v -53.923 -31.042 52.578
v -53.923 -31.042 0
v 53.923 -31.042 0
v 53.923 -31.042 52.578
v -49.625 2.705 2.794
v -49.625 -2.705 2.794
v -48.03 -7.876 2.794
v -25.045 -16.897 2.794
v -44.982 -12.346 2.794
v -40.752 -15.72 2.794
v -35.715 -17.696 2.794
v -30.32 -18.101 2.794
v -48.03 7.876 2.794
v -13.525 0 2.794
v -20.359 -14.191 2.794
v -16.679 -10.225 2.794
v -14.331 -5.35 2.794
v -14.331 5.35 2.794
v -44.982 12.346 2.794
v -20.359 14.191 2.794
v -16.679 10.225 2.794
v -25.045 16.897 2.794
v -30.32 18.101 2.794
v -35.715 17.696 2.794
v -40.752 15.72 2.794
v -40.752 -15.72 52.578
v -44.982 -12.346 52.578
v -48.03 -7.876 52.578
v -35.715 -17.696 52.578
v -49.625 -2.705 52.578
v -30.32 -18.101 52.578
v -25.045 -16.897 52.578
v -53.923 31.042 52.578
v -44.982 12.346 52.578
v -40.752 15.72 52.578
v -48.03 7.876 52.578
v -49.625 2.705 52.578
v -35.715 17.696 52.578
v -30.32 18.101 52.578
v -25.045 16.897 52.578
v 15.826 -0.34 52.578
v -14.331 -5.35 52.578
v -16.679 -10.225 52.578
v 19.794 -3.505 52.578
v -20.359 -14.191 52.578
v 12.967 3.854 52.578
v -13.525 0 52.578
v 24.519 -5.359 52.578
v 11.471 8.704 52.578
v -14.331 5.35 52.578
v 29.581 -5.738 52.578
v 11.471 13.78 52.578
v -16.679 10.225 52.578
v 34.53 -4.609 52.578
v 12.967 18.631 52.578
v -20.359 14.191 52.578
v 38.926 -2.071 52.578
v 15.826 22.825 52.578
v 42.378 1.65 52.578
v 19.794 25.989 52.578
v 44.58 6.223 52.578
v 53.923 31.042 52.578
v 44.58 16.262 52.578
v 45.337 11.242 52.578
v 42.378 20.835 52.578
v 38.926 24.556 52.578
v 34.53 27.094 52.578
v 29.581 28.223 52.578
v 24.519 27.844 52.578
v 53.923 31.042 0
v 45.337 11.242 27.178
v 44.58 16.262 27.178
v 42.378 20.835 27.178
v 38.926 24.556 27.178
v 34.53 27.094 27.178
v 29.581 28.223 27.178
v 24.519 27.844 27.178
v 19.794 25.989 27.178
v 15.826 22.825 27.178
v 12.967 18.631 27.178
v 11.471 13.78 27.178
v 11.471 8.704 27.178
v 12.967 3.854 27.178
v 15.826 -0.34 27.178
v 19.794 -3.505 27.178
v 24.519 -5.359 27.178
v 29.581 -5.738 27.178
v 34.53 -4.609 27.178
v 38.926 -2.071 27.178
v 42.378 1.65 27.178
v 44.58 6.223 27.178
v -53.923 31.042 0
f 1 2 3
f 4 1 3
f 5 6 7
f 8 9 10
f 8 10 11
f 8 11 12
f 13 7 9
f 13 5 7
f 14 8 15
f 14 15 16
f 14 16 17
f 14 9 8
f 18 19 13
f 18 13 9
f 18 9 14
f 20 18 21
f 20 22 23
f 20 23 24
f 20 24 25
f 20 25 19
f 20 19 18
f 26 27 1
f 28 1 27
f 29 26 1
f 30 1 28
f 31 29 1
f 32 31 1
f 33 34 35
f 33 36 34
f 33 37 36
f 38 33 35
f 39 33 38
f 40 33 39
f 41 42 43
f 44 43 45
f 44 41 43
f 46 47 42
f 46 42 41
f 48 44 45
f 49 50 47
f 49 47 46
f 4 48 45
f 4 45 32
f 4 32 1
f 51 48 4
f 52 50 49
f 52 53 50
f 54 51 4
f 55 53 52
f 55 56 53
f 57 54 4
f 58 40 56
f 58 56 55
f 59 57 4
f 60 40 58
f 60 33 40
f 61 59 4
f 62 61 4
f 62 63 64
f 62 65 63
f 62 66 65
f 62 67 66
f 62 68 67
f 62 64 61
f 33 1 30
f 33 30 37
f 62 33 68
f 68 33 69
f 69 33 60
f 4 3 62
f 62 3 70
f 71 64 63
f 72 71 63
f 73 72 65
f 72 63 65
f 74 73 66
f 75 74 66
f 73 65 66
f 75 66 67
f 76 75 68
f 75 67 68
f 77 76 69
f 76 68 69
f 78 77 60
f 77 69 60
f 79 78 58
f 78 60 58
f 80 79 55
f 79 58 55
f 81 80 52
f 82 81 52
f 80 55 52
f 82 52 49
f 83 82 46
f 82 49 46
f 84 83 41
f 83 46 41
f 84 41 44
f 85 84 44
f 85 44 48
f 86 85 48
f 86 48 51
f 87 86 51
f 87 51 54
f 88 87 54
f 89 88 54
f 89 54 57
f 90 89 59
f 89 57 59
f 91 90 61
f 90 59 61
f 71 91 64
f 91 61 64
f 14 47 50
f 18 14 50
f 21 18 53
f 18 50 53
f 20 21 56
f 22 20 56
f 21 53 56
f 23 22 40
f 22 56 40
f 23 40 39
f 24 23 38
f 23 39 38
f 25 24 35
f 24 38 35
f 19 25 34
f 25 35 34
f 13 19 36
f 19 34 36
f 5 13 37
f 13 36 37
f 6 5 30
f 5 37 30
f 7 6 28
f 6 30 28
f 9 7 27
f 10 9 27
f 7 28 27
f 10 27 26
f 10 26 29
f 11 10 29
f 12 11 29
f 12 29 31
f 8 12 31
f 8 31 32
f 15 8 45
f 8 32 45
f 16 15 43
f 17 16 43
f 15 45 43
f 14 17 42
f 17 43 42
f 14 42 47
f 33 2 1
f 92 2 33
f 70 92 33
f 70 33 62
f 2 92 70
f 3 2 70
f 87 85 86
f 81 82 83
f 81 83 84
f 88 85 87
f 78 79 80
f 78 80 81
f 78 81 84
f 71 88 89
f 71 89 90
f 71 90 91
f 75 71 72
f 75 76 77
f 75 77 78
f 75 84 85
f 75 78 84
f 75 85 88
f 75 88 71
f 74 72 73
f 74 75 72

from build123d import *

# Parameters (mm, degrees)
F0_W     = 107.845894
F0_H     = 62.084262
F1_DEPTH = 52.578
F2_R     = 18.151489
F3_DEPTH = 49.784
F4_R     = 17.028329
F5_DEPTH = 25.4


with BuildPart() as f1:
    # F0 (on Top) → F1 (new body)
    with BuildSketch(Plane.XY):
        Rectangle(F0_W, F0_H)
    extrude(amount=F1_DEPTH)

    # F2 (on face) → F3 (cut)
    with BuildSketch(Plane.XY.offset(52.578)):
        with Locations((-31.67621, 0)):
            Circle(F2_R)
    extrude(amount=-F3_DEPTH, mode=Mode.SUBTRACT)

    # F4 (on face) → F5 (cut)
    with BuildSketch(Plane.XY.offset(52.578)):
        with Locations((28.308643, 11.2424)):
            Circle(F4_R)
    extrude(amount=-F5_DEPTH, mode=Mode.SUBTRACT)


solid = f1.part
